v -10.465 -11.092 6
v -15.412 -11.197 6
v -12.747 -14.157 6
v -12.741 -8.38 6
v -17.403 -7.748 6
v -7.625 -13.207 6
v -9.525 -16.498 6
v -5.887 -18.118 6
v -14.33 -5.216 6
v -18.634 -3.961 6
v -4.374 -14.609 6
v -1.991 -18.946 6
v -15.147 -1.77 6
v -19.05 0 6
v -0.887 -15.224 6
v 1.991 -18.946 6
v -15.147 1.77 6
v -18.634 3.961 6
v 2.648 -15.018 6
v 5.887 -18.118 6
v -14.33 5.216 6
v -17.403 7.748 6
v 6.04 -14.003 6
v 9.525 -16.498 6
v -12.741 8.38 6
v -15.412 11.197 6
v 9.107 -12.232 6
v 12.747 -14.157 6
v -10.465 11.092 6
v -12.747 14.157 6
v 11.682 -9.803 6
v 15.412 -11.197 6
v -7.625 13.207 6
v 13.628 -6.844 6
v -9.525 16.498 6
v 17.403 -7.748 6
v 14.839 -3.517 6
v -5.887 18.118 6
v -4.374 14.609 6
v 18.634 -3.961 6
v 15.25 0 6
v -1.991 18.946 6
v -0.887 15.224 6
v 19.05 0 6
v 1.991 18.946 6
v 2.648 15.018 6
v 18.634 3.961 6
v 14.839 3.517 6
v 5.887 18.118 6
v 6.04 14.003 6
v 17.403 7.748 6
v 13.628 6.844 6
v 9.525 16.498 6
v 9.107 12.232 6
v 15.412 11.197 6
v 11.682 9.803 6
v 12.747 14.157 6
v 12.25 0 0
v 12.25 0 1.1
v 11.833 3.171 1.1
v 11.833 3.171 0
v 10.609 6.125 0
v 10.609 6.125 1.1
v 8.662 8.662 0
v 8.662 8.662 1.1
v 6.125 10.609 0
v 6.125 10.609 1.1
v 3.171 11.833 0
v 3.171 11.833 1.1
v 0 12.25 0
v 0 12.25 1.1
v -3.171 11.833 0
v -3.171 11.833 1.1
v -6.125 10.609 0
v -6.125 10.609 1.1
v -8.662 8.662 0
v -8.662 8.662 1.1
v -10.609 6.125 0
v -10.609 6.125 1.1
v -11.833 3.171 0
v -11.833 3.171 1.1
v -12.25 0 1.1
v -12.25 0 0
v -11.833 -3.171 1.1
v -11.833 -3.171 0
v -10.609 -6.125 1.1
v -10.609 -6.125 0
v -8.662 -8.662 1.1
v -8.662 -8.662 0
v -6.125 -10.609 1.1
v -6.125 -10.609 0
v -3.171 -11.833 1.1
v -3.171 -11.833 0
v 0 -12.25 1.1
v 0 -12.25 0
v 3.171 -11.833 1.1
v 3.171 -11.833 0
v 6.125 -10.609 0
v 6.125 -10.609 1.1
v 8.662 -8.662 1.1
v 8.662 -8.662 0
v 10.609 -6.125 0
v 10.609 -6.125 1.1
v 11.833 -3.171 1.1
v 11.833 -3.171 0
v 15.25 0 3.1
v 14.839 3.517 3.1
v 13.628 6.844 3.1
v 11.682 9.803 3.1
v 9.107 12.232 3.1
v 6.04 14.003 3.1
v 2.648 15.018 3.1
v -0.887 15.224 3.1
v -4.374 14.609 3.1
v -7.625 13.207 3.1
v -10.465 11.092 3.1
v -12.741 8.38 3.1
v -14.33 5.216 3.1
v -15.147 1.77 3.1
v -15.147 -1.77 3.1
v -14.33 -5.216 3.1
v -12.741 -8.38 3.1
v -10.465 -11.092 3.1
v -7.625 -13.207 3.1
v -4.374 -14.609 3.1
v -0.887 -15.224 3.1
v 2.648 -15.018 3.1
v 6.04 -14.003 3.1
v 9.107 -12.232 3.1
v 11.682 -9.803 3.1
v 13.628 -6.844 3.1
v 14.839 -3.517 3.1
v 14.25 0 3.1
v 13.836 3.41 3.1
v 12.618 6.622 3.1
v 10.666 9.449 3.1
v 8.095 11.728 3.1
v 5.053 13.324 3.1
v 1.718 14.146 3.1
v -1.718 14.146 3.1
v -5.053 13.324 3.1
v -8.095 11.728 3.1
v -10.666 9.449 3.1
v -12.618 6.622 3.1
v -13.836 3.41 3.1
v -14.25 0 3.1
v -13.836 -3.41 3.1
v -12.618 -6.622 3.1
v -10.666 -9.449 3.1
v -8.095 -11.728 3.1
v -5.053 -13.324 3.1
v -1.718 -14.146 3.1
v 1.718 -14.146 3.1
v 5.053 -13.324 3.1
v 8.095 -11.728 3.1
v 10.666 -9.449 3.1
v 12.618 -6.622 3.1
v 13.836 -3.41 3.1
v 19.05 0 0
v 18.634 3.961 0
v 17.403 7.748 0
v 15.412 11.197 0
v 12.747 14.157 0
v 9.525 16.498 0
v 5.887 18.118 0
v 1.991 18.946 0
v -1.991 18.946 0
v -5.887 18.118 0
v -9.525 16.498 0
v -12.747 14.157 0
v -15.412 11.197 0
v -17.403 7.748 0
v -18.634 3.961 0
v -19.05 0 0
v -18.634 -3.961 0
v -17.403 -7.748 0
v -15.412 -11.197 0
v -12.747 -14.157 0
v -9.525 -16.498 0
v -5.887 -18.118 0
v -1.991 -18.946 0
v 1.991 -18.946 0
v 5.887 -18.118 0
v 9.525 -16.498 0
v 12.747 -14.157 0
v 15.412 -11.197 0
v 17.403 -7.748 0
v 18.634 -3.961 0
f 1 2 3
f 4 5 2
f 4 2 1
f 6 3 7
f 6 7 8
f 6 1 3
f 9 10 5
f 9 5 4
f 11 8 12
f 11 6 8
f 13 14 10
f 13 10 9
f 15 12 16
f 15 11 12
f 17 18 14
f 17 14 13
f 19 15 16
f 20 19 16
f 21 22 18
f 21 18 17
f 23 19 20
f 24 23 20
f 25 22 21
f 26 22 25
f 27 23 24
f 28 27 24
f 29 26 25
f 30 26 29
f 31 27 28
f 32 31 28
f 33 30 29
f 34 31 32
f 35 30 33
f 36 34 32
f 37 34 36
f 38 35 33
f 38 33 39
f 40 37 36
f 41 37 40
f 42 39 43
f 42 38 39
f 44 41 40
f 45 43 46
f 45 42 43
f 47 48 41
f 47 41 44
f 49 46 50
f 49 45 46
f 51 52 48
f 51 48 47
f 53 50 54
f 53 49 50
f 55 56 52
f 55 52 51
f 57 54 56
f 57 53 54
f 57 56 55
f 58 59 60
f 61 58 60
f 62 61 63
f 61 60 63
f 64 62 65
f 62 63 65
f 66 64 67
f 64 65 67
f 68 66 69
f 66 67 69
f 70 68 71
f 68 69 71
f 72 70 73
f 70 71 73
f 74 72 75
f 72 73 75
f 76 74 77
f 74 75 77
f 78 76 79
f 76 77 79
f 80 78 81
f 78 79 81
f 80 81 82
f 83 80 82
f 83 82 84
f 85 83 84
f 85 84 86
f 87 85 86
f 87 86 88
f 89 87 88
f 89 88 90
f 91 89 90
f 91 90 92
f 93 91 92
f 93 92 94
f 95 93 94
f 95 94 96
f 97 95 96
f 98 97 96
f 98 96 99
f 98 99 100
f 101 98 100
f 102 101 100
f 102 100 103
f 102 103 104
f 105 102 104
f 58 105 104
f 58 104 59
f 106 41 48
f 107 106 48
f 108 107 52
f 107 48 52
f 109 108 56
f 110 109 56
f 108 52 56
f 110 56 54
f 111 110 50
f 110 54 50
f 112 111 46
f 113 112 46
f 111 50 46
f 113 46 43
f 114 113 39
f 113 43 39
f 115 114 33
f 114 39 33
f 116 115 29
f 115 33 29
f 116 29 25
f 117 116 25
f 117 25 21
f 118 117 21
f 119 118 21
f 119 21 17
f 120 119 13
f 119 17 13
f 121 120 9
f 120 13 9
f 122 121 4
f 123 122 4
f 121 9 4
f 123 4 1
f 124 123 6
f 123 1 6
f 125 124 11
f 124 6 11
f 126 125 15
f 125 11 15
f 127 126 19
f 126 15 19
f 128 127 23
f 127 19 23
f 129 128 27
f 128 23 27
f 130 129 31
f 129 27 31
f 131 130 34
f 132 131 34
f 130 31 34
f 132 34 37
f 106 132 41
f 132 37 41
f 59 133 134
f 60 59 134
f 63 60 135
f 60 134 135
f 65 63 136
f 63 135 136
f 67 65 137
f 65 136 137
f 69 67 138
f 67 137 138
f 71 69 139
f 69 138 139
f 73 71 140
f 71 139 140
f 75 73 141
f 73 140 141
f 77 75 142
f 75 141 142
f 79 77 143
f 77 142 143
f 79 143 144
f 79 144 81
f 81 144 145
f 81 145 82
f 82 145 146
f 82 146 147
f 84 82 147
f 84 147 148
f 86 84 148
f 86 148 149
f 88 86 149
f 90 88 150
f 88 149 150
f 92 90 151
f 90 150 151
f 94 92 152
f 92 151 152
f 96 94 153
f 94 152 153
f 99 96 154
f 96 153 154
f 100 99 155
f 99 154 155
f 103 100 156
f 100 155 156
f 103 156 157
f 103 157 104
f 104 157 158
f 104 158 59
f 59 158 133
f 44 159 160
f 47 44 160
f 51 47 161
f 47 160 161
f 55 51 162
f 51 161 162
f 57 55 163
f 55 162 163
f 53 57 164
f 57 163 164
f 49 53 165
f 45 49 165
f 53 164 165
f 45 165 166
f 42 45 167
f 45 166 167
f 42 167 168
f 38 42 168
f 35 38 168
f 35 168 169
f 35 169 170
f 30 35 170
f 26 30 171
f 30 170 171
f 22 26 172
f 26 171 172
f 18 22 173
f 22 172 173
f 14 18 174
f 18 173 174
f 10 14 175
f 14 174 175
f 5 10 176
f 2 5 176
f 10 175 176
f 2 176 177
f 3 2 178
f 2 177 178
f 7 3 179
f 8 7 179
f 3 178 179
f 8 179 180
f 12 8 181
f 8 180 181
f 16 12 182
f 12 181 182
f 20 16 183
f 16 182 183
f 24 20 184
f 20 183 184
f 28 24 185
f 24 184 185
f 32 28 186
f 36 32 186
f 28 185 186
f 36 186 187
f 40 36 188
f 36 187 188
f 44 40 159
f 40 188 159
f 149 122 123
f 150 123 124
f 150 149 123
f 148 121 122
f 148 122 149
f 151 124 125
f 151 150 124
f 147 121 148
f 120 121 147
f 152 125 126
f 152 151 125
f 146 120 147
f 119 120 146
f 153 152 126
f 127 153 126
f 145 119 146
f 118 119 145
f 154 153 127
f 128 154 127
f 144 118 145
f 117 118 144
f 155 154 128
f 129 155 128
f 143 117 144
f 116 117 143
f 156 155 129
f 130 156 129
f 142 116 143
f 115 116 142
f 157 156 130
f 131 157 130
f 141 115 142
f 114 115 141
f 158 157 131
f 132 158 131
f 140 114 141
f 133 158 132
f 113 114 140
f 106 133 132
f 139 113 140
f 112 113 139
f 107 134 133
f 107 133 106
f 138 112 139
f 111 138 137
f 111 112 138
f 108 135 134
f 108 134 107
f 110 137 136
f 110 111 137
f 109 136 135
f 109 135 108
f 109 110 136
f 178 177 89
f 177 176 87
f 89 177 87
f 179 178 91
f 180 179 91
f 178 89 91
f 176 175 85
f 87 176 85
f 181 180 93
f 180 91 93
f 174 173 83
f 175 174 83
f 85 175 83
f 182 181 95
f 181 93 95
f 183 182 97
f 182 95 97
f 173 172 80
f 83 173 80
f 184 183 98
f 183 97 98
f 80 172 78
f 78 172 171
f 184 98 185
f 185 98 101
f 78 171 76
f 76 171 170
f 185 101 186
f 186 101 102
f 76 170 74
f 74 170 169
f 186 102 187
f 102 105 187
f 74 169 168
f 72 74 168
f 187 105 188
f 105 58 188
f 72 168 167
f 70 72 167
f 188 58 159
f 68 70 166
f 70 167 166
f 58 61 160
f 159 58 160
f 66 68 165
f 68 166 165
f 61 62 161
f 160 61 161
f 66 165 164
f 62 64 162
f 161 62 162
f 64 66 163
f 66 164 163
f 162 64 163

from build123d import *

# Parameters (mm, degrees)
F0_R     = 19.05
F1_DEPTH = 6
F2_R     = 12.25
F3_DEPTH = 6
F4_R     = 15.25
F5_DEPTH = 2.9
F6_SIZE  = 2


# Not quite as in the source:
# - a feature names something its author has since deleted; it is built from what else it names


with BuildPart() as f1:
    # F0 (on Top) → F1 (new body)
    with BuildSketch(Plane.XY):
        Circle(F0_R)
    extrude(amount=F1_DEPTH)

    # F2 (on face) → F3 (cut)
    with BuildSketch(Plane.XY.offset(6)):
        Circle(F2_R)
    extrude(amount=-F3_DEPTH, mode=Mode.SUBTRACT)

    # F4 (on face) → F5 (cut)
    with BuildSketch(Plane.XY.offset(6)):
        Circle(F4_R)
    extrude(amount=-F5_DEPTH, mode=Mode.SUBTRACT)

    # F6
    f6_edges = [f1.edges().sort_by_distance(p)[0] for p in [
        (-12.25, 0, 3.1),
    ]]
    chamfer(f6_edges, length=F6_SIZE)


solid = f1.part
